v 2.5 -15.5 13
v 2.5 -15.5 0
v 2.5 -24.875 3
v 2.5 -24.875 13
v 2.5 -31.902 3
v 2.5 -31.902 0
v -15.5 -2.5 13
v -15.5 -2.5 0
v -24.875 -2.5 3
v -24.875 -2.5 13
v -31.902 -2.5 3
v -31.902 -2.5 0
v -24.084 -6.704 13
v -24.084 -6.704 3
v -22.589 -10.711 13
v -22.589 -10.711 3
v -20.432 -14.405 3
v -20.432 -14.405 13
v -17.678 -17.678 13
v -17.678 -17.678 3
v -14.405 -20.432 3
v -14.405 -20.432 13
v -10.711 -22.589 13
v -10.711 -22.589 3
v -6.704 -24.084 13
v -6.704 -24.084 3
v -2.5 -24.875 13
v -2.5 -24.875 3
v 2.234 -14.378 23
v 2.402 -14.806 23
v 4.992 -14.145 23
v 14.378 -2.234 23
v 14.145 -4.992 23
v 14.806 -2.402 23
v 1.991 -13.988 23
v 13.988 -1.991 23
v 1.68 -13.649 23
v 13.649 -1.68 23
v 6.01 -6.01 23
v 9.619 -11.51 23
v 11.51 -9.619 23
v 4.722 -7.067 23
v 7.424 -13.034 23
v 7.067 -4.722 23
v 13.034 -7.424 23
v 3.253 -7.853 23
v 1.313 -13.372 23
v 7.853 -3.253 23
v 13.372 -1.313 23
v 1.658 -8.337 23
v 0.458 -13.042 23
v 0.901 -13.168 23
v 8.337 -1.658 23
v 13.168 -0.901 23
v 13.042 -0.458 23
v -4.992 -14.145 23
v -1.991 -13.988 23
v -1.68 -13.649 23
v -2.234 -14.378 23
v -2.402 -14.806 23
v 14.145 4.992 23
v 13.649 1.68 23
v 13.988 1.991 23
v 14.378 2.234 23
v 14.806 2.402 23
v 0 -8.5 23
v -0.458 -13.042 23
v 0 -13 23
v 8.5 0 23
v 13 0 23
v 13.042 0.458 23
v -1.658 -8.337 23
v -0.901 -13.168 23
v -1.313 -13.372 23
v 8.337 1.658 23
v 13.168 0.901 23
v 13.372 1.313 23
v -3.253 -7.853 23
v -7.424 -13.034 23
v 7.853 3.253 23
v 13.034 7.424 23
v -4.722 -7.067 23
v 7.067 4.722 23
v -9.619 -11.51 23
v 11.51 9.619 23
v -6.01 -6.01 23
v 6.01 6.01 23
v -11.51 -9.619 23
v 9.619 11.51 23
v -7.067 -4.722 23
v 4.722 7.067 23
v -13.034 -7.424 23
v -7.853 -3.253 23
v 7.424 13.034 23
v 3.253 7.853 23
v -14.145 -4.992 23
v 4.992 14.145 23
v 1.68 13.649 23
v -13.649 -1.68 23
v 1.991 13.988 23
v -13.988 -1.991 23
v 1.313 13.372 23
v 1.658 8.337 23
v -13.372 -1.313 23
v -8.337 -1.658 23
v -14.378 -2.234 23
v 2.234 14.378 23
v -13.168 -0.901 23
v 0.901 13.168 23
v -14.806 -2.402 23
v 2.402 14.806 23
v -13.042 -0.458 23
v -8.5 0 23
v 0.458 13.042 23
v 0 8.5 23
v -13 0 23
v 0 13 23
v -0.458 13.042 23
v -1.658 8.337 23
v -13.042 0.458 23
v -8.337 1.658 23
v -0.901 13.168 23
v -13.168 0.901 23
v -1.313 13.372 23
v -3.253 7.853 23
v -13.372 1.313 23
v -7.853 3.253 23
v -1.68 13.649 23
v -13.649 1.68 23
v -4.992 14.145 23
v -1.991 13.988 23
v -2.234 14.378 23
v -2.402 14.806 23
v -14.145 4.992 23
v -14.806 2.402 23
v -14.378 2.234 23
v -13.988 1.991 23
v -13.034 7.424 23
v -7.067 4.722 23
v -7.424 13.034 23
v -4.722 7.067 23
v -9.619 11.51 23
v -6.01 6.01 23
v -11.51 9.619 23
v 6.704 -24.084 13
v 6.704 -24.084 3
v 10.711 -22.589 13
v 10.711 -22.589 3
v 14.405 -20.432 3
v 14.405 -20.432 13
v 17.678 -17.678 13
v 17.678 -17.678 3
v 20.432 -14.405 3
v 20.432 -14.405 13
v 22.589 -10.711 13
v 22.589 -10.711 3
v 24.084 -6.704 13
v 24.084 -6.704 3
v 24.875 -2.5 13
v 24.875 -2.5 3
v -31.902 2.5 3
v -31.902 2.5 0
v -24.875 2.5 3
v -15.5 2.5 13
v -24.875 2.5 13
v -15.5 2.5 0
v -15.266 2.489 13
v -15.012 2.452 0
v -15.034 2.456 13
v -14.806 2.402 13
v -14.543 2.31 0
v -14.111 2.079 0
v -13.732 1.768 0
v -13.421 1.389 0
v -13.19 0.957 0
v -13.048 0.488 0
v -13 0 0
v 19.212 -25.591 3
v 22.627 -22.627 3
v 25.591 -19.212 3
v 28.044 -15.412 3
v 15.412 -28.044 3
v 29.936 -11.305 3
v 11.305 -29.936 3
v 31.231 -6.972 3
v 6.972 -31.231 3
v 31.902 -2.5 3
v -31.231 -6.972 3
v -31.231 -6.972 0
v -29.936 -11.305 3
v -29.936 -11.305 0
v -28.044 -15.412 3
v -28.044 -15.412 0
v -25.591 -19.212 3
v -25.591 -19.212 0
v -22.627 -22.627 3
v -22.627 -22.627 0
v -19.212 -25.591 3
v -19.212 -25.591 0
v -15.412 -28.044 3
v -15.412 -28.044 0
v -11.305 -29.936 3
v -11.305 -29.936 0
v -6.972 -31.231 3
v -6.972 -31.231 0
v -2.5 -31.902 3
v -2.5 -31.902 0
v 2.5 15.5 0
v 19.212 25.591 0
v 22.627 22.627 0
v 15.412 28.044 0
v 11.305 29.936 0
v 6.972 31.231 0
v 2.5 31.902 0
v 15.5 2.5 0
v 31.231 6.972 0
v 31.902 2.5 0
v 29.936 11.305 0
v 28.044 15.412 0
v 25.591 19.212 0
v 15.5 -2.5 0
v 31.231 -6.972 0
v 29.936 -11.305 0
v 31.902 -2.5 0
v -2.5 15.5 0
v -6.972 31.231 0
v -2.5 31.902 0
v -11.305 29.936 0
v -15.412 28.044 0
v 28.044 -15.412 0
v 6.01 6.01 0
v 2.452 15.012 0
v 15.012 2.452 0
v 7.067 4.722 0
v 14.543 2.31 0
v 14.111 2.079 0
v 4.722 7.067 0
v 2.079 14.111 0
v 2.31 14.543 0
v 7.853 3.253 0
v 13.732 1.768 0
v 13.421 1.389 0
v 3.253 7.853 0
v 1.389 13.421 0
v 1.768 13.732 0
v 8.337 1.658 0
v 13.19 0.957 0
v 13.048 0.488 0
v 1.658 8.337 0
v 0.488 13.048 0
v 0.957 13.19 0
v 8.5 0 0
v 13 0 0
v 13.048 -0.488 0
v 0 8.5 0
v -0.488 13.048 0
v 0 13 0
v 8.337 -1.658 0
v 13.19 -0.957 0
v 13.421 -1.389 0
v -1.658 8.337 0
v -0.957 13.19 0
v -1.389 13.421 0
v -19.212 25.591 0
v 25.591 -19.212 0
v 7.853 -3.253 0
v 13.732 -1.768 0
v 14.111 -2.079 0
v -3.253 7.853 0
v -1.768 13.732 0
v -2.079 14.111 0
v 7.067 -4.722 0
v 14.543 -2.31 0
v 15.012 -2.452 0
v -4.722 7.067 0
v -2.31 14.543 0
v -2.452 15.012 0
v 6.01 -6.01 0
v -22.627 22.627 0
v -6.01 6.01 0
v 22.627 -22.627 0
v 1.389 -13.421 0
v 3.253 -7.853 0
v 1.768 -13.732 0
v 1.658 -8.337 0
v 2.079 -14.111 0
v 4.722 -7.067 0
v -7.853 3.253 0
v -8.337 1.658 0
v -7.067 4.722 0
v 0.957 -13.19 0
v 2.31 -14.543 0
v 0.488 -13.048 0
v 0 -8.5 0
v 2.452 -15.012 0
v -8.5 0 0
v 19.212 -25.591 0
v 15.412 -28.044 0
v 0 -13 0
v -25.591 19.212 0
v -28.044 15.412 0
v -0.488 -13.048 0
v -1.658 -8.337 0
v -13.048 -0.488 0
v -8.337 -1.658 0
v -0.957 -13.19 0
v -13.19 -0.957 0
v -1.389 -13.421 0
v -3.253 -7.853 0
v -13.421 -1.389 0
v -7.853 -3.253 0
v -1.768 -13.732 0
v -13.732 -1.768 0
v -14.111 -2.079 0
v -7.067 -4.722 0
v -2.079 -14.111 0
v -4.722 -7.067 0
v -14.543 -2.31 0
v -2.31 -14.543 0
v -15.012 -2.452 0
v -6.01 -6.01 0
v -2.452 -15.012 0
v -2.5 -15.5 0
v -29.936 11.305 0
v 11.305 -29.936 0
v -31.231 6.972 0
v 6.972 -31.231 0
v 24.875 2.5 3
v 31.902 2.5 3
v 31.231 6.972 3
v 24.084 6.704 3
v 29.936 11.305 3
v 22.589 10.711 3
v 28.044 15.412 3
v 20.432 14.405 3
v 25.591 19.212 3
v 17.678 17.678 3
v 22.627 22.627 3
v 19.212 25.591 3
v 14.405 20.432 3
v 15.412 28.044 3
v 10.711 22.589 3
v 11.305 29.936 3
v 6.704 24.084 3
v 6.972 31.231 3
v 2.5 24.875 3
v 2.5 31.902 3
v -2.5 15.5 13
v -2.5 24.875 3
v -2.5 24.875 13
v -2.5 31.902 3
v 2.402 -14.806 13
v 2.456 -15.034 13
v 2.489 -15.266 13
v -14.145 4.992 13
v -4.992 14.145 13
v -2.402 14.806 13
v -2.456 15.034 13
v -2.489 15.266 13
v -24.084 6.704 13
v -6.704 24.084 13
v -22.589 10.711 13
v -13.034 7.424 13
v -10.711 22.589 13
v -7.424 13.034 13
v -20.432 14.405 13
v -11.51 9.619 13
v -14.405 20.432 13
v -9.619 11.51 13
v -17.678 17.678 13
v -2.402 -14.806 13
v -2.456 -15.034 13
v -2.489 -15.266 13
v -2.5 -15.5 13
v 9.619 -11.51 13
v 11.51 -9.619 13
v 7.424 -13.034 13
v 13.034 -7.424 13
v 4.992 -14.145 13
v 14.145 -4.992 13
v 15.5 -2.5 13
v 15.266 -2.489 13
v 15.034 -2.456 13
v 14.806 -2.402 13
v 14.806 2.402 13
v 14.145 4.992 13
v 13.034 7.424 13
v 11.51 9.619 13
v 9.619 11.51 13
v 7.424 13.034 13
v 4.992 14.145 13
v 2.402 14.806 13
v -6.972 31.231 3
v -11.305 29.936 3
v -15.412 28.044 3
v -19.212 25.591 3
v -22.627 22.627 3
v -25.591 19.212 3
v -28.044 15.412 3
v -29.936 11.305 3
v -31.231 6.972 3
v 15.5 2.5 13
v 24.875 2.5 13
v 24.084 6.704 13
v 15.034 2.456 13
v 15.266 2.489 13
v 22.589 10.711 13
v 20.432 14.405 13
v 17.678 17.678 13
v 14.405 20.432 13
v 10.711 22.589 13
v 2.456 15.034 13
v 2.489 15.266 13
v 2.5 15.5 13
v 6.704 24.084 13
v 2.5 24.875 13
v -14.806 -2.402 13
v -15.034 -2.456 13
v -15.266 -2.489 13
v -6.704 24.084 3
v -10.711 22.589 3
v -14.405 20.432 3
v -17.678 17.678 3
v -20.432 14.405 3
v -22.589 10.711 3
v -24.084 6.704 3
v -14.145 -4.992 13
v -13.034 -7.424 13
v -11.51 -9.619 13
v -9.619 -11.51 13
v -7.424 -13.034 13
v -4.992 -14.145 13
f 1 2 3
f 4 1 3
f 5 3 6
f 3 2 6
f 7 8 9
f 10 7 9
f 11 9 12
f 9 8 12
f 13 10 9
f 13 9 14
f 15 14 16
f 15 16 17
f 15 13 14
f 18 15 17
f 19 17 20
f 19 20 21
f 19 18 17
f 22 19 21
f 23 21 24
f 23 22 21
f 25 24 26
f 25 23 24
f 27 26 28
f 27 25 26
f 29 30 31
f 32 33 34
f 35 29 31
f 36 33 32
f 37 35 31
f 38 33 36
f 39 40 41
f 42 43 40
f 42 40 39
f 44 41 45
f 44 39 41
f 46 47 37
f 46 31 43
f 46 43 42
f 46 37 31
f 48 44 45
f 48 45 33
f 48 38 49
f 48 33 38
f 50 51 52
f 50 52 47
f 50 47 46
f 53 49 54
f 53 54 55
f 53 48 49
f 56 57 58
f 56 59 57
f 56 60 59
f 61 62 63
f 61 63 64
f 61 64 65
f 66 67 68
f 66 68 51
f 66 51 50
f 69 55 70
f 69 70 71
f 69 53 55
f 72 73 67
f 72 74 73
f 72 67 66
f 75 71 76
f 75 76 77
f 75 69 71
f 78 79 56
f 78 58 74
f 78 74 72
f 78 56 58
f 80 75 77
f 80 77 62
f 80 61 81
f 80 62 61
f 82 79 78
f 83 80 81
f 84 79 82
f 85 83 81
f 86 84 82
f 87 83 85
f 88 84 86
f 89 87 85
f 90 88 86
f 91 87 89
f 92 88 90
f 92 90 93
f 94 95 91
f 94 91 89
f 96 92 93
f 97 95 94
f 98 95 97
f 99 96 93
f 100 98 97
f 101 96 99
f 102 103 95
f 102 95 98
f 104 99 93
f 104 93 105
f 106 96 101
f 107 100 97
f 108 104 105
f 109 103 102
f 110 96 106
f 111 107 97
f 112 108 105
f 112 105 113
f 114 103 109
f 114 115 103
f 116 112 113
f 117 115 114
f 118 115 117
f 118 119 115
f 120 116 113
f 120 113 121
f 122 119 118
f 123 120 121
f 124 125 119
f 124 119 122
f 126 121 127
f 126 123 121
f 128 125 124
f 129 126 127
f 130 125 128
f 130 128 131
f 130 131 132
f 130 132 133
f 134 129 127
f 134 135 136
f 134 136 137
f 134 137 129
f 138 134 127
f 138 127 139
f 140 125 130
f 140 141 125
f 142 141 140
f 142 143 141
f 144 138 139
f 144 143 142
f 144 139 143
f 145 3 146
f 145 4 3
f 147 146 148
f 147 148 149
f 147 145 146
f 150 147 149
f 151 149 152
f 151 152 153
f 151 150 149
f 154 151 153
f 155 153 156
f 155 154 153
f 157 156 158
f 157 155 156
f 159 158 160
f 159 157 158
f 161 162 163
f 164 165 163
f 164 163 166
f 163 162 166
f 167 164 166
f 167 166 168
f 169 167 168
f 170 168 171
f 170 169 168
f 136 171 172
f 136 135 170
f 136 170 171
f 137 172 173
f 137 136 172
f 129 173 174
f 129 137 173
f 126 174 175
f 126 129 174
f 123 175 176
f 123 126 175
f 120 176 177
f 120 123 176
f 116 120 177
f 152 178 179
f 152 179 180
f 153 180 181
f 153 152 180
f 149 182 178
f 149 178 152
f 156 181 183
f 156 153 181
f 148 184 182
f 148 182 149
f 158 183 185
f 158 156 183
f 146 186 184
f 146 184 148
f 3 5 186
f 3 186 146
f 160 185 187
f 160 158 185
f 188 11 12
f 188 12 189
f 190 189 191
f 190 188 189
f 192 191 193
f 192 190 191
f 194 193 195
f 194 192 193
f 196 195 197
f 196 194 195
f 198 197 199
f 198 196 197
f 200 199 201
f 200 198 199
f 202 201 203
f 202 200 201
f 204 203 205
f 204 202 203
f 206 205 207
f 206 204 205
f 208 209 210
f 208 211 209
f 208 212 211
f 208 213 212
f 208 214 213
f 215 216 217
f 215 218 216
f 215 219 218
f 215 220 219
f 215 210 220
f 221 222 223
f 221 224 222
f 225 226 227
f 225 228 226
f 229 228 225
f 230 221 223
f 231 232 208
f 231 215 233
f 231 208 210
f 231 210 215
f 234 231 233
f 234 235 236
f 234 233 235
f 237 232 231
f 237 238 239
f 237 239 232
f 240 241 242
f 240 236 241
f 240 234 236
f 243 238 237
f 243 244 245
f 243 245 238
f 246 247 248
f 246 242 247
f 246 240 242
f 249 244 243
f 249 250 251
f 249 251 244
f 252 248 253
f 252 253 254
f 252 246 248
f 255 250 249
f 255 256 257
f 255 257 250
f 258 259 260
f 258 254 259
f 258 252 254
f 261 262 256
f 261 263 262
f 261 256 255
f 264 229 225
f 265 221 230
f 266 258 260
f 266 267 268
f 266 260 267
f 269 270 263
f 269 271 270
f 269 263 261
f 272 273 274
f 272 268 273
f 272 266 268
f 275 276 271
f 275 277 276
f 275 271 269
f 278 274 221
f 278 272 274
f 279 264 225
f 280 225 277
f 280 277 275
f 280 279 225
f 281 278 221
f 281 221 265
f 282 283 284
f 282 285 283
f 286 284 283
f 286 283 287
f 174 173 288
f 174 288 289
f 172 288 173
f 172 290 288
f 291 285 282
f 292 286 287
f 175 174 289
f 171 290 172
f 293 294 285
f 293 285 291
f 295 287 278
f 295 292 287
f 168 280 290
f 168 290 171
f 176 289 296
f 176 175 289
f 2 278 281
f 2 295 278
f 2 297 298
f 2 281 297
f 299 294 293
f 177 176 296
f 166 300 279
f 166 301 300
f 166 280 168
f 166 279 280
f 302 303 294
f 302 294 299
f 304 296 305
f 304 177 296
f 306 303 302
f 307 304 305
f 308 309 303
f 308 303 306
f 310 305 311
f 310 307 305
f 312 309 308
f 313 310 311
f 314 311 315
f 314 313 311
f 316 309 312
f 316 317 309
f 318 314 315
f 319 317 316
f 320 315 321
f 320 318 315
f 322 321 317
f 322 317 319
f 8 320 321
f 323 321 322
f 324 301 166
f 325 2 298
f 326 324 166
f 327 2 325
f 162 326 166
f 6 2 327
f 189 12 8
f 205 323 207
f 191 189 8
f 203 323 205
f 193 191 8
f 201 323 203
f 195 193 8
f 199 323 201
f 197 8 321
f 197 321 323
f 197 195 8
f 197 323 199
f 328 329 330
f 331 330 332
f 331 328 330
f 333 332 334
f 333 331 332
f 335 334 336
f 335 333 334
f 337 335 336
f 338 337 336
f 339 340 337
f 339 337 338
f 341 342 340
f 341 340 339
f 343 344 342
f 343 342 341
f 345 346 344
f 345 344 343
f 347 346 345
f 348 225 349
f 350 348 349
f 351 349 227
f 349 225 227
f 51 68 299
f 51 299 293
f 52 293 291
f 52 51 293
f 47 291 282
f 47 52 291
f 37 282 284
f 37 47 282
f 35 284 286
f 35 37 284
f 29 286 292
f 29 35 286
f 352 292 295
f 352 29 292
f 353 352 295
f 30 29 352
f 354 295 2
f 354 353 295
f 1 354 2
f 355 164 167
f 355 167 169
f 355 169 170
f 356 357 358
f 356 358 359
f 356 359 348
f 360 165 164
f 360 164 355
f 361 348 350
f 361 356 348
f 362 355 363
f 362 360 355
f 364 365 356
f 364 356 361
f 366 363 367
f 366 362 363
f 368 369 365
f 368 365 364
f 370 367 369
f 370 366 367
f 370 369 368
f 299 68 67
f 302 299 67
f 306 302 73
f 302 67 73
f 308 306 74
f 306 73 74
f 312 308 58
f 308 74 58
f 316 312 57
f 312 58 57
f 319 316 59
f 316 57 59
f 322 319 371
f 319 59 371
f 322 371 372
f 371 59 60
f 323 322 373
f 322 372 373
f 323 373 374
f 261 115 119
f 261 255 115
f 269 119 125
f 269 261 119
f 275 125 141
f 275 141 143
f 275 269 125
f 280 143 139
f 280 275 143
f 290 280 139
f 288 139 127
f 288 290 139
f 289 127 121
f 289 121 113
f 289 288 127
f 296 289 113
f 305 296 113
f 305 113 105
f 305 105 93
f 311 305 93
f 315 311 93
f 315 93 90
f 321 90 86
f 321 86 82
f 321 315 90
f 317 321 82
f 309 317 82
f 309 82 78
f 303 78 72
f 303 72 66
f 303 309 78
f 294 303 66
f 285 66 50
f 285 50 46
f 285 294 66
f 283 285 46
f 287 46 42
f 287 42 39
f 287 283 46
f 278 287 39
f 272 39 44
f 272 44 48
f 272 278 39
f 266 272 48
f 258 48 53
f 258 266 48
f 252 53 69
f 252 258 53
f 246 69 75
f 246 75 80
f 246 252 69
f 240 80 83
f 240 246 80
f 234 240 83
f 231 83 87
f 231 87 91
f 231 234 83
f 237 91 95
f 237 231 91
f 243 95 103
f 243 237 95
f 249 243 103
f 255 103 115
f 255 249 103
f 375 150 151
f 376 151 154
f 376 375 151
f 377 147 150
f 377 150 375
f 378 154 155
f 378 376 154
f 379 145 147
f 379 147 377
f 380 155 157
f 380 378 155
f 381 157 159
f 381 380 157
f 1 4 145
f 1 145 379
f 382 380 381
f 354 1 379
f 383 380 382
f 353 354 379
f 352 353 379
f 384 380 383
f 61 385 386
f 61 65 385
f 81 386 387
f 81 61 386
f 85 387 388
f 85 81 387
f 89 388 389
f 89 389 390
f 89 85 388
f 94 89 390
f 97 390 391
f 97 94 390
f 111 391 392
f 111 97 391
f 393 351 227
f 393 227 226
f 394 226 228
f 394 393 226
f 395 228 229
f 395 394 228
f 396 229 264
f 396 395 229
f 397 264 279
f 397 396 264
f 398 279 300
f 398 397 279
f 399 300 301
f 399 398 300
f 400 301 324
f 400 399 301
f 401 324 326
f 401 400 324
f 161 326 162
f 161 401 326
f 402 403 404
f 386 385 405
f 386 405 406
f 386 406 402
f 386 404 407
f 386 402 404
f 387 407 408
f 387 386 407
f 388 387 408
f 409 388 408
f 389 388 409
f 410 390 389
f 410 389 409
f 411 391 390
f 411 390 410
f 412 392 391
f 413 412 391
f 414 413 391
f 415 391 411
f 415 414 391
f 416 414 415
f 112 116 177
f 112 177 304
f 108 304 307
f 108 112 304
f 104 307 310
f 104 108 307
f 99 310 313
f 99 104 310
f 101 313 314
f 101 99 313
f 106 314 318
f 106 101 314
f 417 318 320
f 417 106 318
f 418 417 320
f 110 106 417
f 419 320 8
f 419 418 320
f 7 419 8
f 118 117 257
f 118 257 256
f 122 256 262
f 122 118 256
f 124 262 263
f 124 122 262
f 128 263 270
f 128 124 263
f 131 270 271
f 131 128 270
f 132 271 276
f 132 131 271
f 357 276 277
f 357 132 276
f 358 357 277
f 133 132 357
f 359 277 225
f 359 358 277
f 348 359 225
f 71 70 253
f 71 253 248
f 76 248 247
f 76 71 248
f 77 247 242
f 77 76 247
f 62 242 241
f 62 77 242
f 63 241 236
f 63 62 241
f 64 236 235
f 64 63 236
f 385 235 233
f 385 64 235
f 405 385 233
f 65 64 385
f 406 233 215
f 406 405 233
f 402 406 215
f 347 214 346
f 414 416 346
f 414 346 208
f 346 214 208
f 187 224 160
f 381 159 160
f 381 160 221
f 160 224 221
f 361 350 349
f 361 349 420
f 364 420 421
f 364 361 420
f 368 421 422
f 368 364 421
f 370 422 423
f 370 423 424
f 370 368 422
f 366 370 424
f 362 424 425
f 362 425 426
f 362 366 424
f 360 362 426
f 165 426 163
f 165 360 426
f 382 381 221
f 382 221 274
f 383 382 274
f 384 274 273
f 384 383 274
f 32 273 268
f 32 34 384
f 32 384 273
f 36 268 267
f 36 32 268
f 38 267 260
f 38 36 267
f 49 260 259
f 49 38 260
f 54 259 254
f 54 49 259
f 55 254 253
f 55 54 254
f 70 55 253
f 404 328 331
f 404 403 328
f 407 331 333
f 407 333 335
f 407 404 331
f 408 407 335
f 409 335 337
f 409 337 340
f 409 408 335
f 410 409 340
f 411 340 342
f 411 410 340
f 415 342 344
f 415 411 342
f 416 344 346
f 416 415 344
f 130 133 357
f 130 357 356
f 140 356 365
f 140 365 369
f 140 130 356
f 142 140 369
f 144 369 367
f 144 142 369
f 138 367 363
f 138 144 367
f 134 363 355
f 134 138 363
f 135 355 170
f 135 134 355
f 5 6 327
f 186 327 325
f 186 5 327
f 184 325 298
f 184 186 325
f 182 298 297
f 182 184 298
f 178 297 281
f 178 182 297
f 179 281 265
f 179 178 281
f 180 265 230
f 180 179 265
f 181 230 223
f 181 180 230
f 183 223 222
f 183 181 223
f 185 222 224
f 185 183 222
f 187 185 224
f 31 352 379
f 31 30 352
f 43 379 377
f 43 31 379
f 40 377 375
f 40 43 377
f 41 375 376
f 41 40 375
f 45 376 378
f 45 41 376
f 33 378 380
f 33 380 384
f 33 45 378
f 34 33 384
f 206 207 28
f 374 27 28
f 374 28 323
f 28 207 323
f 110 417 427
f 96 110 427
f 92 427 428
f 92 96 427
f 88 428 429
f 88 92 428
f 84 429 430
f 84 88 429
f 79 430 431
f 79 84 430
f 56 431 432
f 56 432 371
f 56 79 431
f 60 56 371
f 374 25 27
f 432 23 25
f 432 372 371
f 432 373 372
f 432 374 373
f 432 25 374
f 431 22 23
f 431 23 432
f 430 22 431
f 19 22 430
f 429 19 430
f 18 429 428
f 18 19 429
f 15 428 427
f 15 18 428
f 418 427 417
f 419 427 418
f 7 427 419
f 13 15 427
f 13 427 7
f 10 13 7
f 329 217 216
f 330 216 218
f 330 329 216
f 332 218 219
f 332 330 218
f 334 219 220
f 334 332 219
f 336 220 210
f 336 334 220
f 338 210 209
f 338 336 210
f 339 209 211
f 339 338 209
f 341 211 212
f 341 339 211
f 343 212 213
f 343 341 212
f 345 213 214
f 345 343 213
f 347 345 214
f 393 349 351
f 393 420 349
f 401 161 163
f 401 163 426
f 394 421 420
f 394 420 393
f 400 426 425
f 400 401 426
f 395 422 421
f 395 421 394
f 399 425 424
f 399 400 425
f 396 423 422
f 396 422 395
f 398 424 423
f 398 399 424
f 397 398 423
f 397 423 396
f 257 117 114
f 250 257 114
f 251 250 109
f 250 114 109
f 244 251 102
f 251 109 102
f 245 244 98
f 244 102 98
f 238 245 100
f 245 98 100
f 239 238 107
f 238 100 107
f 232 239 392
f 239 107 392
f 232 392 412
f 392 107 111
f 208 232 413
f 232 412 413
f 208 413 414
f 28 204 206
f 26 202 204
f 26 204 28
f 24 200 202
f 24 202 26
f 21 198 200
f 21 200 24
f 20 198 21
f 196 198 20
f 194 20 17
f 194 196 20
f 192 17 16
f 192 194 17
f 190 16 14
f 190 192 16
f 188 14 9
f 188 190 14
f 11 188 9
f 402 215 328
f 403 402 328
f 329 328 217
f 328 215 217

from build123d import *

# Parameters (mm, degrees)
F3_DEPTH = 23.001
F4_R     = 2.5
F4_R_2   = 2.49999


# Not quite as in the source:
# - a fillet or chamfer is up to 0.001 mm smaller than in the source, because OpenCascade refuses the exact size


with BuildPart() as f1:
    # F0 (on Right) → F1 (revolve)
    with BuildSketch(Plane.YZ):
        Polygon((8.5, 23), (8.5, 0), (32, 0), (32, 3), (25, 3), (25, 13), (15, 13), (15, 23), align=None)
    revolve(axis=Axis((0, 0, 31.7647196352), (0, 0, 1)))

    # F2 (on face) → F3 (cut, through all)
    with BuildSketch(Plane(origin=(0, 0, 0), x_dir=(1, 0, 0), z_dir=(0, 0, -1))):
        with BuildLine():
            Line((-2.5, 13), (2.5, 13))
            Line((2.5, 13), (2.5, 31.9021942819))
            ThreePointArc((2.5, 31.9021942819), (0, 32), (-2.5, 31.9021942819))
            Line((-2.5, 31.9021942819), (-2.5, 13))
        make_face()
        with BuildLine():
            ThreePointArc((32, 0), (31.9755392216, 1.2509562301), (31.9021942819, 2.5))
            Line((31.9021942819, 2.5), (13, 2.5))
            Line((13, 2.5), (13, -2.5))
            Line((13, -2.5), (31.9021942819, -2.5))
            ThreePointArc((31.9021942819, -2.5), (31.9755392216, -1.2509562301), (32, 0))
        make_face()
        with BuildLine():
            Line((-2.5, -13), (-2.5, -31.9021942819))
            ThreePointArc((-2.5, -31.9021942819), (0, -32), (2.5, -31.9021942819))
            Line((2.5, -31.9021942819), (2.5, -13))
            Line((2.5, -13), (-2.5, -13))
        make_face()
        with BuildLine():
            Line((-13, 2.5), (-31.9021942819, 2.5))
            ThreePointArc((-31.9021942819, 2.5), (-32, 0), (-31.9021942819, -2.5))
            Line((-31.9021942819, -2.5), (-13, -2.5))
            Line((-13, -2.5), (-13, 2.5))
        make_face()
    extrude(amount=-F3_DEPTH, mode=Mode.SUBTRACT)

    # F4 (call 1 of 8: OpenCascade refuses the feature's edges together)
    f4_edges = [f1.edges().sort_by_distance(p)[0] for p in [
        (-2.5, -13, 11.5),
    ]]
    fillet(f4_edges, radius=F4_R)

    # F4#2 (call 2 of 8) (radius 2.5 in the source; OpenCascade refuses exactly that, so slightly less here)
    f4_2_edges = [f1.edges().sort_by_distance(p)[0] for p in [
        (2.5, -13, 11.5),
    ]]
    fillet(f4_2_edges, radius=F4_R_2)

    # F4#3 (call 3 of 8)
    f4_3_edges = [f1.edges().sort_by_distance(p)[0] for p in [
        (13, -2.5, 11.5),
    ]]
    fillet(f4_3_edges, radius=F4_R)

    # F4#4 (call 4 of 8) (radius 2.5 in the source; OpenCascade refuses exactly that, so slightly less here)
    f4_4_edges = [f1.edges().sort_by_distance(p)[0] for p in [
        (13, 2.5, 11.5),
    ]]
    fillet(f4_4_edges, radius=F4_R_2)

    # F4#5 (call 5 of 8)
    f4_5_edges = [f1.edges().sort_by_distance(p)[0] for p in [
        (-2.5, 13, 11.5),
    ]]
    fillet(f4_5_edges, radius=F4_R)

    # F4#6 (call 6 of 8) (radius 2.5 in the source; OpenCascade refuses exactly that, so slightly less here)
    f4_6_edges = [f1.edges().sort_by_distance(p)[0] for p in [
        (2.5, 13, 11.5),
    ]]
    fillet(f4_6_edges, radius=F4_R_2)

    # F4#7 (call 7 of 8)
    f4_7_edges = [f1.edges().sort_by_distance(p)[0] for p in [
        (-13, 2.5, 11.5),
    ]]
    fillet(f4_7_edges, radius=F4_R)

    # F4#8 (call 8 of 8) (radius 2.5 in the source; OpenCascade refuses exactly that, so slightly less here)
    f4_8_edges = [f1.edges().sort_by_distance(p)[0] for p in [
        (-13, -2.5, 11.5),
    ]]
    fillet(f4_8_edges, radius=F4_R_2)


solid = f1.part
